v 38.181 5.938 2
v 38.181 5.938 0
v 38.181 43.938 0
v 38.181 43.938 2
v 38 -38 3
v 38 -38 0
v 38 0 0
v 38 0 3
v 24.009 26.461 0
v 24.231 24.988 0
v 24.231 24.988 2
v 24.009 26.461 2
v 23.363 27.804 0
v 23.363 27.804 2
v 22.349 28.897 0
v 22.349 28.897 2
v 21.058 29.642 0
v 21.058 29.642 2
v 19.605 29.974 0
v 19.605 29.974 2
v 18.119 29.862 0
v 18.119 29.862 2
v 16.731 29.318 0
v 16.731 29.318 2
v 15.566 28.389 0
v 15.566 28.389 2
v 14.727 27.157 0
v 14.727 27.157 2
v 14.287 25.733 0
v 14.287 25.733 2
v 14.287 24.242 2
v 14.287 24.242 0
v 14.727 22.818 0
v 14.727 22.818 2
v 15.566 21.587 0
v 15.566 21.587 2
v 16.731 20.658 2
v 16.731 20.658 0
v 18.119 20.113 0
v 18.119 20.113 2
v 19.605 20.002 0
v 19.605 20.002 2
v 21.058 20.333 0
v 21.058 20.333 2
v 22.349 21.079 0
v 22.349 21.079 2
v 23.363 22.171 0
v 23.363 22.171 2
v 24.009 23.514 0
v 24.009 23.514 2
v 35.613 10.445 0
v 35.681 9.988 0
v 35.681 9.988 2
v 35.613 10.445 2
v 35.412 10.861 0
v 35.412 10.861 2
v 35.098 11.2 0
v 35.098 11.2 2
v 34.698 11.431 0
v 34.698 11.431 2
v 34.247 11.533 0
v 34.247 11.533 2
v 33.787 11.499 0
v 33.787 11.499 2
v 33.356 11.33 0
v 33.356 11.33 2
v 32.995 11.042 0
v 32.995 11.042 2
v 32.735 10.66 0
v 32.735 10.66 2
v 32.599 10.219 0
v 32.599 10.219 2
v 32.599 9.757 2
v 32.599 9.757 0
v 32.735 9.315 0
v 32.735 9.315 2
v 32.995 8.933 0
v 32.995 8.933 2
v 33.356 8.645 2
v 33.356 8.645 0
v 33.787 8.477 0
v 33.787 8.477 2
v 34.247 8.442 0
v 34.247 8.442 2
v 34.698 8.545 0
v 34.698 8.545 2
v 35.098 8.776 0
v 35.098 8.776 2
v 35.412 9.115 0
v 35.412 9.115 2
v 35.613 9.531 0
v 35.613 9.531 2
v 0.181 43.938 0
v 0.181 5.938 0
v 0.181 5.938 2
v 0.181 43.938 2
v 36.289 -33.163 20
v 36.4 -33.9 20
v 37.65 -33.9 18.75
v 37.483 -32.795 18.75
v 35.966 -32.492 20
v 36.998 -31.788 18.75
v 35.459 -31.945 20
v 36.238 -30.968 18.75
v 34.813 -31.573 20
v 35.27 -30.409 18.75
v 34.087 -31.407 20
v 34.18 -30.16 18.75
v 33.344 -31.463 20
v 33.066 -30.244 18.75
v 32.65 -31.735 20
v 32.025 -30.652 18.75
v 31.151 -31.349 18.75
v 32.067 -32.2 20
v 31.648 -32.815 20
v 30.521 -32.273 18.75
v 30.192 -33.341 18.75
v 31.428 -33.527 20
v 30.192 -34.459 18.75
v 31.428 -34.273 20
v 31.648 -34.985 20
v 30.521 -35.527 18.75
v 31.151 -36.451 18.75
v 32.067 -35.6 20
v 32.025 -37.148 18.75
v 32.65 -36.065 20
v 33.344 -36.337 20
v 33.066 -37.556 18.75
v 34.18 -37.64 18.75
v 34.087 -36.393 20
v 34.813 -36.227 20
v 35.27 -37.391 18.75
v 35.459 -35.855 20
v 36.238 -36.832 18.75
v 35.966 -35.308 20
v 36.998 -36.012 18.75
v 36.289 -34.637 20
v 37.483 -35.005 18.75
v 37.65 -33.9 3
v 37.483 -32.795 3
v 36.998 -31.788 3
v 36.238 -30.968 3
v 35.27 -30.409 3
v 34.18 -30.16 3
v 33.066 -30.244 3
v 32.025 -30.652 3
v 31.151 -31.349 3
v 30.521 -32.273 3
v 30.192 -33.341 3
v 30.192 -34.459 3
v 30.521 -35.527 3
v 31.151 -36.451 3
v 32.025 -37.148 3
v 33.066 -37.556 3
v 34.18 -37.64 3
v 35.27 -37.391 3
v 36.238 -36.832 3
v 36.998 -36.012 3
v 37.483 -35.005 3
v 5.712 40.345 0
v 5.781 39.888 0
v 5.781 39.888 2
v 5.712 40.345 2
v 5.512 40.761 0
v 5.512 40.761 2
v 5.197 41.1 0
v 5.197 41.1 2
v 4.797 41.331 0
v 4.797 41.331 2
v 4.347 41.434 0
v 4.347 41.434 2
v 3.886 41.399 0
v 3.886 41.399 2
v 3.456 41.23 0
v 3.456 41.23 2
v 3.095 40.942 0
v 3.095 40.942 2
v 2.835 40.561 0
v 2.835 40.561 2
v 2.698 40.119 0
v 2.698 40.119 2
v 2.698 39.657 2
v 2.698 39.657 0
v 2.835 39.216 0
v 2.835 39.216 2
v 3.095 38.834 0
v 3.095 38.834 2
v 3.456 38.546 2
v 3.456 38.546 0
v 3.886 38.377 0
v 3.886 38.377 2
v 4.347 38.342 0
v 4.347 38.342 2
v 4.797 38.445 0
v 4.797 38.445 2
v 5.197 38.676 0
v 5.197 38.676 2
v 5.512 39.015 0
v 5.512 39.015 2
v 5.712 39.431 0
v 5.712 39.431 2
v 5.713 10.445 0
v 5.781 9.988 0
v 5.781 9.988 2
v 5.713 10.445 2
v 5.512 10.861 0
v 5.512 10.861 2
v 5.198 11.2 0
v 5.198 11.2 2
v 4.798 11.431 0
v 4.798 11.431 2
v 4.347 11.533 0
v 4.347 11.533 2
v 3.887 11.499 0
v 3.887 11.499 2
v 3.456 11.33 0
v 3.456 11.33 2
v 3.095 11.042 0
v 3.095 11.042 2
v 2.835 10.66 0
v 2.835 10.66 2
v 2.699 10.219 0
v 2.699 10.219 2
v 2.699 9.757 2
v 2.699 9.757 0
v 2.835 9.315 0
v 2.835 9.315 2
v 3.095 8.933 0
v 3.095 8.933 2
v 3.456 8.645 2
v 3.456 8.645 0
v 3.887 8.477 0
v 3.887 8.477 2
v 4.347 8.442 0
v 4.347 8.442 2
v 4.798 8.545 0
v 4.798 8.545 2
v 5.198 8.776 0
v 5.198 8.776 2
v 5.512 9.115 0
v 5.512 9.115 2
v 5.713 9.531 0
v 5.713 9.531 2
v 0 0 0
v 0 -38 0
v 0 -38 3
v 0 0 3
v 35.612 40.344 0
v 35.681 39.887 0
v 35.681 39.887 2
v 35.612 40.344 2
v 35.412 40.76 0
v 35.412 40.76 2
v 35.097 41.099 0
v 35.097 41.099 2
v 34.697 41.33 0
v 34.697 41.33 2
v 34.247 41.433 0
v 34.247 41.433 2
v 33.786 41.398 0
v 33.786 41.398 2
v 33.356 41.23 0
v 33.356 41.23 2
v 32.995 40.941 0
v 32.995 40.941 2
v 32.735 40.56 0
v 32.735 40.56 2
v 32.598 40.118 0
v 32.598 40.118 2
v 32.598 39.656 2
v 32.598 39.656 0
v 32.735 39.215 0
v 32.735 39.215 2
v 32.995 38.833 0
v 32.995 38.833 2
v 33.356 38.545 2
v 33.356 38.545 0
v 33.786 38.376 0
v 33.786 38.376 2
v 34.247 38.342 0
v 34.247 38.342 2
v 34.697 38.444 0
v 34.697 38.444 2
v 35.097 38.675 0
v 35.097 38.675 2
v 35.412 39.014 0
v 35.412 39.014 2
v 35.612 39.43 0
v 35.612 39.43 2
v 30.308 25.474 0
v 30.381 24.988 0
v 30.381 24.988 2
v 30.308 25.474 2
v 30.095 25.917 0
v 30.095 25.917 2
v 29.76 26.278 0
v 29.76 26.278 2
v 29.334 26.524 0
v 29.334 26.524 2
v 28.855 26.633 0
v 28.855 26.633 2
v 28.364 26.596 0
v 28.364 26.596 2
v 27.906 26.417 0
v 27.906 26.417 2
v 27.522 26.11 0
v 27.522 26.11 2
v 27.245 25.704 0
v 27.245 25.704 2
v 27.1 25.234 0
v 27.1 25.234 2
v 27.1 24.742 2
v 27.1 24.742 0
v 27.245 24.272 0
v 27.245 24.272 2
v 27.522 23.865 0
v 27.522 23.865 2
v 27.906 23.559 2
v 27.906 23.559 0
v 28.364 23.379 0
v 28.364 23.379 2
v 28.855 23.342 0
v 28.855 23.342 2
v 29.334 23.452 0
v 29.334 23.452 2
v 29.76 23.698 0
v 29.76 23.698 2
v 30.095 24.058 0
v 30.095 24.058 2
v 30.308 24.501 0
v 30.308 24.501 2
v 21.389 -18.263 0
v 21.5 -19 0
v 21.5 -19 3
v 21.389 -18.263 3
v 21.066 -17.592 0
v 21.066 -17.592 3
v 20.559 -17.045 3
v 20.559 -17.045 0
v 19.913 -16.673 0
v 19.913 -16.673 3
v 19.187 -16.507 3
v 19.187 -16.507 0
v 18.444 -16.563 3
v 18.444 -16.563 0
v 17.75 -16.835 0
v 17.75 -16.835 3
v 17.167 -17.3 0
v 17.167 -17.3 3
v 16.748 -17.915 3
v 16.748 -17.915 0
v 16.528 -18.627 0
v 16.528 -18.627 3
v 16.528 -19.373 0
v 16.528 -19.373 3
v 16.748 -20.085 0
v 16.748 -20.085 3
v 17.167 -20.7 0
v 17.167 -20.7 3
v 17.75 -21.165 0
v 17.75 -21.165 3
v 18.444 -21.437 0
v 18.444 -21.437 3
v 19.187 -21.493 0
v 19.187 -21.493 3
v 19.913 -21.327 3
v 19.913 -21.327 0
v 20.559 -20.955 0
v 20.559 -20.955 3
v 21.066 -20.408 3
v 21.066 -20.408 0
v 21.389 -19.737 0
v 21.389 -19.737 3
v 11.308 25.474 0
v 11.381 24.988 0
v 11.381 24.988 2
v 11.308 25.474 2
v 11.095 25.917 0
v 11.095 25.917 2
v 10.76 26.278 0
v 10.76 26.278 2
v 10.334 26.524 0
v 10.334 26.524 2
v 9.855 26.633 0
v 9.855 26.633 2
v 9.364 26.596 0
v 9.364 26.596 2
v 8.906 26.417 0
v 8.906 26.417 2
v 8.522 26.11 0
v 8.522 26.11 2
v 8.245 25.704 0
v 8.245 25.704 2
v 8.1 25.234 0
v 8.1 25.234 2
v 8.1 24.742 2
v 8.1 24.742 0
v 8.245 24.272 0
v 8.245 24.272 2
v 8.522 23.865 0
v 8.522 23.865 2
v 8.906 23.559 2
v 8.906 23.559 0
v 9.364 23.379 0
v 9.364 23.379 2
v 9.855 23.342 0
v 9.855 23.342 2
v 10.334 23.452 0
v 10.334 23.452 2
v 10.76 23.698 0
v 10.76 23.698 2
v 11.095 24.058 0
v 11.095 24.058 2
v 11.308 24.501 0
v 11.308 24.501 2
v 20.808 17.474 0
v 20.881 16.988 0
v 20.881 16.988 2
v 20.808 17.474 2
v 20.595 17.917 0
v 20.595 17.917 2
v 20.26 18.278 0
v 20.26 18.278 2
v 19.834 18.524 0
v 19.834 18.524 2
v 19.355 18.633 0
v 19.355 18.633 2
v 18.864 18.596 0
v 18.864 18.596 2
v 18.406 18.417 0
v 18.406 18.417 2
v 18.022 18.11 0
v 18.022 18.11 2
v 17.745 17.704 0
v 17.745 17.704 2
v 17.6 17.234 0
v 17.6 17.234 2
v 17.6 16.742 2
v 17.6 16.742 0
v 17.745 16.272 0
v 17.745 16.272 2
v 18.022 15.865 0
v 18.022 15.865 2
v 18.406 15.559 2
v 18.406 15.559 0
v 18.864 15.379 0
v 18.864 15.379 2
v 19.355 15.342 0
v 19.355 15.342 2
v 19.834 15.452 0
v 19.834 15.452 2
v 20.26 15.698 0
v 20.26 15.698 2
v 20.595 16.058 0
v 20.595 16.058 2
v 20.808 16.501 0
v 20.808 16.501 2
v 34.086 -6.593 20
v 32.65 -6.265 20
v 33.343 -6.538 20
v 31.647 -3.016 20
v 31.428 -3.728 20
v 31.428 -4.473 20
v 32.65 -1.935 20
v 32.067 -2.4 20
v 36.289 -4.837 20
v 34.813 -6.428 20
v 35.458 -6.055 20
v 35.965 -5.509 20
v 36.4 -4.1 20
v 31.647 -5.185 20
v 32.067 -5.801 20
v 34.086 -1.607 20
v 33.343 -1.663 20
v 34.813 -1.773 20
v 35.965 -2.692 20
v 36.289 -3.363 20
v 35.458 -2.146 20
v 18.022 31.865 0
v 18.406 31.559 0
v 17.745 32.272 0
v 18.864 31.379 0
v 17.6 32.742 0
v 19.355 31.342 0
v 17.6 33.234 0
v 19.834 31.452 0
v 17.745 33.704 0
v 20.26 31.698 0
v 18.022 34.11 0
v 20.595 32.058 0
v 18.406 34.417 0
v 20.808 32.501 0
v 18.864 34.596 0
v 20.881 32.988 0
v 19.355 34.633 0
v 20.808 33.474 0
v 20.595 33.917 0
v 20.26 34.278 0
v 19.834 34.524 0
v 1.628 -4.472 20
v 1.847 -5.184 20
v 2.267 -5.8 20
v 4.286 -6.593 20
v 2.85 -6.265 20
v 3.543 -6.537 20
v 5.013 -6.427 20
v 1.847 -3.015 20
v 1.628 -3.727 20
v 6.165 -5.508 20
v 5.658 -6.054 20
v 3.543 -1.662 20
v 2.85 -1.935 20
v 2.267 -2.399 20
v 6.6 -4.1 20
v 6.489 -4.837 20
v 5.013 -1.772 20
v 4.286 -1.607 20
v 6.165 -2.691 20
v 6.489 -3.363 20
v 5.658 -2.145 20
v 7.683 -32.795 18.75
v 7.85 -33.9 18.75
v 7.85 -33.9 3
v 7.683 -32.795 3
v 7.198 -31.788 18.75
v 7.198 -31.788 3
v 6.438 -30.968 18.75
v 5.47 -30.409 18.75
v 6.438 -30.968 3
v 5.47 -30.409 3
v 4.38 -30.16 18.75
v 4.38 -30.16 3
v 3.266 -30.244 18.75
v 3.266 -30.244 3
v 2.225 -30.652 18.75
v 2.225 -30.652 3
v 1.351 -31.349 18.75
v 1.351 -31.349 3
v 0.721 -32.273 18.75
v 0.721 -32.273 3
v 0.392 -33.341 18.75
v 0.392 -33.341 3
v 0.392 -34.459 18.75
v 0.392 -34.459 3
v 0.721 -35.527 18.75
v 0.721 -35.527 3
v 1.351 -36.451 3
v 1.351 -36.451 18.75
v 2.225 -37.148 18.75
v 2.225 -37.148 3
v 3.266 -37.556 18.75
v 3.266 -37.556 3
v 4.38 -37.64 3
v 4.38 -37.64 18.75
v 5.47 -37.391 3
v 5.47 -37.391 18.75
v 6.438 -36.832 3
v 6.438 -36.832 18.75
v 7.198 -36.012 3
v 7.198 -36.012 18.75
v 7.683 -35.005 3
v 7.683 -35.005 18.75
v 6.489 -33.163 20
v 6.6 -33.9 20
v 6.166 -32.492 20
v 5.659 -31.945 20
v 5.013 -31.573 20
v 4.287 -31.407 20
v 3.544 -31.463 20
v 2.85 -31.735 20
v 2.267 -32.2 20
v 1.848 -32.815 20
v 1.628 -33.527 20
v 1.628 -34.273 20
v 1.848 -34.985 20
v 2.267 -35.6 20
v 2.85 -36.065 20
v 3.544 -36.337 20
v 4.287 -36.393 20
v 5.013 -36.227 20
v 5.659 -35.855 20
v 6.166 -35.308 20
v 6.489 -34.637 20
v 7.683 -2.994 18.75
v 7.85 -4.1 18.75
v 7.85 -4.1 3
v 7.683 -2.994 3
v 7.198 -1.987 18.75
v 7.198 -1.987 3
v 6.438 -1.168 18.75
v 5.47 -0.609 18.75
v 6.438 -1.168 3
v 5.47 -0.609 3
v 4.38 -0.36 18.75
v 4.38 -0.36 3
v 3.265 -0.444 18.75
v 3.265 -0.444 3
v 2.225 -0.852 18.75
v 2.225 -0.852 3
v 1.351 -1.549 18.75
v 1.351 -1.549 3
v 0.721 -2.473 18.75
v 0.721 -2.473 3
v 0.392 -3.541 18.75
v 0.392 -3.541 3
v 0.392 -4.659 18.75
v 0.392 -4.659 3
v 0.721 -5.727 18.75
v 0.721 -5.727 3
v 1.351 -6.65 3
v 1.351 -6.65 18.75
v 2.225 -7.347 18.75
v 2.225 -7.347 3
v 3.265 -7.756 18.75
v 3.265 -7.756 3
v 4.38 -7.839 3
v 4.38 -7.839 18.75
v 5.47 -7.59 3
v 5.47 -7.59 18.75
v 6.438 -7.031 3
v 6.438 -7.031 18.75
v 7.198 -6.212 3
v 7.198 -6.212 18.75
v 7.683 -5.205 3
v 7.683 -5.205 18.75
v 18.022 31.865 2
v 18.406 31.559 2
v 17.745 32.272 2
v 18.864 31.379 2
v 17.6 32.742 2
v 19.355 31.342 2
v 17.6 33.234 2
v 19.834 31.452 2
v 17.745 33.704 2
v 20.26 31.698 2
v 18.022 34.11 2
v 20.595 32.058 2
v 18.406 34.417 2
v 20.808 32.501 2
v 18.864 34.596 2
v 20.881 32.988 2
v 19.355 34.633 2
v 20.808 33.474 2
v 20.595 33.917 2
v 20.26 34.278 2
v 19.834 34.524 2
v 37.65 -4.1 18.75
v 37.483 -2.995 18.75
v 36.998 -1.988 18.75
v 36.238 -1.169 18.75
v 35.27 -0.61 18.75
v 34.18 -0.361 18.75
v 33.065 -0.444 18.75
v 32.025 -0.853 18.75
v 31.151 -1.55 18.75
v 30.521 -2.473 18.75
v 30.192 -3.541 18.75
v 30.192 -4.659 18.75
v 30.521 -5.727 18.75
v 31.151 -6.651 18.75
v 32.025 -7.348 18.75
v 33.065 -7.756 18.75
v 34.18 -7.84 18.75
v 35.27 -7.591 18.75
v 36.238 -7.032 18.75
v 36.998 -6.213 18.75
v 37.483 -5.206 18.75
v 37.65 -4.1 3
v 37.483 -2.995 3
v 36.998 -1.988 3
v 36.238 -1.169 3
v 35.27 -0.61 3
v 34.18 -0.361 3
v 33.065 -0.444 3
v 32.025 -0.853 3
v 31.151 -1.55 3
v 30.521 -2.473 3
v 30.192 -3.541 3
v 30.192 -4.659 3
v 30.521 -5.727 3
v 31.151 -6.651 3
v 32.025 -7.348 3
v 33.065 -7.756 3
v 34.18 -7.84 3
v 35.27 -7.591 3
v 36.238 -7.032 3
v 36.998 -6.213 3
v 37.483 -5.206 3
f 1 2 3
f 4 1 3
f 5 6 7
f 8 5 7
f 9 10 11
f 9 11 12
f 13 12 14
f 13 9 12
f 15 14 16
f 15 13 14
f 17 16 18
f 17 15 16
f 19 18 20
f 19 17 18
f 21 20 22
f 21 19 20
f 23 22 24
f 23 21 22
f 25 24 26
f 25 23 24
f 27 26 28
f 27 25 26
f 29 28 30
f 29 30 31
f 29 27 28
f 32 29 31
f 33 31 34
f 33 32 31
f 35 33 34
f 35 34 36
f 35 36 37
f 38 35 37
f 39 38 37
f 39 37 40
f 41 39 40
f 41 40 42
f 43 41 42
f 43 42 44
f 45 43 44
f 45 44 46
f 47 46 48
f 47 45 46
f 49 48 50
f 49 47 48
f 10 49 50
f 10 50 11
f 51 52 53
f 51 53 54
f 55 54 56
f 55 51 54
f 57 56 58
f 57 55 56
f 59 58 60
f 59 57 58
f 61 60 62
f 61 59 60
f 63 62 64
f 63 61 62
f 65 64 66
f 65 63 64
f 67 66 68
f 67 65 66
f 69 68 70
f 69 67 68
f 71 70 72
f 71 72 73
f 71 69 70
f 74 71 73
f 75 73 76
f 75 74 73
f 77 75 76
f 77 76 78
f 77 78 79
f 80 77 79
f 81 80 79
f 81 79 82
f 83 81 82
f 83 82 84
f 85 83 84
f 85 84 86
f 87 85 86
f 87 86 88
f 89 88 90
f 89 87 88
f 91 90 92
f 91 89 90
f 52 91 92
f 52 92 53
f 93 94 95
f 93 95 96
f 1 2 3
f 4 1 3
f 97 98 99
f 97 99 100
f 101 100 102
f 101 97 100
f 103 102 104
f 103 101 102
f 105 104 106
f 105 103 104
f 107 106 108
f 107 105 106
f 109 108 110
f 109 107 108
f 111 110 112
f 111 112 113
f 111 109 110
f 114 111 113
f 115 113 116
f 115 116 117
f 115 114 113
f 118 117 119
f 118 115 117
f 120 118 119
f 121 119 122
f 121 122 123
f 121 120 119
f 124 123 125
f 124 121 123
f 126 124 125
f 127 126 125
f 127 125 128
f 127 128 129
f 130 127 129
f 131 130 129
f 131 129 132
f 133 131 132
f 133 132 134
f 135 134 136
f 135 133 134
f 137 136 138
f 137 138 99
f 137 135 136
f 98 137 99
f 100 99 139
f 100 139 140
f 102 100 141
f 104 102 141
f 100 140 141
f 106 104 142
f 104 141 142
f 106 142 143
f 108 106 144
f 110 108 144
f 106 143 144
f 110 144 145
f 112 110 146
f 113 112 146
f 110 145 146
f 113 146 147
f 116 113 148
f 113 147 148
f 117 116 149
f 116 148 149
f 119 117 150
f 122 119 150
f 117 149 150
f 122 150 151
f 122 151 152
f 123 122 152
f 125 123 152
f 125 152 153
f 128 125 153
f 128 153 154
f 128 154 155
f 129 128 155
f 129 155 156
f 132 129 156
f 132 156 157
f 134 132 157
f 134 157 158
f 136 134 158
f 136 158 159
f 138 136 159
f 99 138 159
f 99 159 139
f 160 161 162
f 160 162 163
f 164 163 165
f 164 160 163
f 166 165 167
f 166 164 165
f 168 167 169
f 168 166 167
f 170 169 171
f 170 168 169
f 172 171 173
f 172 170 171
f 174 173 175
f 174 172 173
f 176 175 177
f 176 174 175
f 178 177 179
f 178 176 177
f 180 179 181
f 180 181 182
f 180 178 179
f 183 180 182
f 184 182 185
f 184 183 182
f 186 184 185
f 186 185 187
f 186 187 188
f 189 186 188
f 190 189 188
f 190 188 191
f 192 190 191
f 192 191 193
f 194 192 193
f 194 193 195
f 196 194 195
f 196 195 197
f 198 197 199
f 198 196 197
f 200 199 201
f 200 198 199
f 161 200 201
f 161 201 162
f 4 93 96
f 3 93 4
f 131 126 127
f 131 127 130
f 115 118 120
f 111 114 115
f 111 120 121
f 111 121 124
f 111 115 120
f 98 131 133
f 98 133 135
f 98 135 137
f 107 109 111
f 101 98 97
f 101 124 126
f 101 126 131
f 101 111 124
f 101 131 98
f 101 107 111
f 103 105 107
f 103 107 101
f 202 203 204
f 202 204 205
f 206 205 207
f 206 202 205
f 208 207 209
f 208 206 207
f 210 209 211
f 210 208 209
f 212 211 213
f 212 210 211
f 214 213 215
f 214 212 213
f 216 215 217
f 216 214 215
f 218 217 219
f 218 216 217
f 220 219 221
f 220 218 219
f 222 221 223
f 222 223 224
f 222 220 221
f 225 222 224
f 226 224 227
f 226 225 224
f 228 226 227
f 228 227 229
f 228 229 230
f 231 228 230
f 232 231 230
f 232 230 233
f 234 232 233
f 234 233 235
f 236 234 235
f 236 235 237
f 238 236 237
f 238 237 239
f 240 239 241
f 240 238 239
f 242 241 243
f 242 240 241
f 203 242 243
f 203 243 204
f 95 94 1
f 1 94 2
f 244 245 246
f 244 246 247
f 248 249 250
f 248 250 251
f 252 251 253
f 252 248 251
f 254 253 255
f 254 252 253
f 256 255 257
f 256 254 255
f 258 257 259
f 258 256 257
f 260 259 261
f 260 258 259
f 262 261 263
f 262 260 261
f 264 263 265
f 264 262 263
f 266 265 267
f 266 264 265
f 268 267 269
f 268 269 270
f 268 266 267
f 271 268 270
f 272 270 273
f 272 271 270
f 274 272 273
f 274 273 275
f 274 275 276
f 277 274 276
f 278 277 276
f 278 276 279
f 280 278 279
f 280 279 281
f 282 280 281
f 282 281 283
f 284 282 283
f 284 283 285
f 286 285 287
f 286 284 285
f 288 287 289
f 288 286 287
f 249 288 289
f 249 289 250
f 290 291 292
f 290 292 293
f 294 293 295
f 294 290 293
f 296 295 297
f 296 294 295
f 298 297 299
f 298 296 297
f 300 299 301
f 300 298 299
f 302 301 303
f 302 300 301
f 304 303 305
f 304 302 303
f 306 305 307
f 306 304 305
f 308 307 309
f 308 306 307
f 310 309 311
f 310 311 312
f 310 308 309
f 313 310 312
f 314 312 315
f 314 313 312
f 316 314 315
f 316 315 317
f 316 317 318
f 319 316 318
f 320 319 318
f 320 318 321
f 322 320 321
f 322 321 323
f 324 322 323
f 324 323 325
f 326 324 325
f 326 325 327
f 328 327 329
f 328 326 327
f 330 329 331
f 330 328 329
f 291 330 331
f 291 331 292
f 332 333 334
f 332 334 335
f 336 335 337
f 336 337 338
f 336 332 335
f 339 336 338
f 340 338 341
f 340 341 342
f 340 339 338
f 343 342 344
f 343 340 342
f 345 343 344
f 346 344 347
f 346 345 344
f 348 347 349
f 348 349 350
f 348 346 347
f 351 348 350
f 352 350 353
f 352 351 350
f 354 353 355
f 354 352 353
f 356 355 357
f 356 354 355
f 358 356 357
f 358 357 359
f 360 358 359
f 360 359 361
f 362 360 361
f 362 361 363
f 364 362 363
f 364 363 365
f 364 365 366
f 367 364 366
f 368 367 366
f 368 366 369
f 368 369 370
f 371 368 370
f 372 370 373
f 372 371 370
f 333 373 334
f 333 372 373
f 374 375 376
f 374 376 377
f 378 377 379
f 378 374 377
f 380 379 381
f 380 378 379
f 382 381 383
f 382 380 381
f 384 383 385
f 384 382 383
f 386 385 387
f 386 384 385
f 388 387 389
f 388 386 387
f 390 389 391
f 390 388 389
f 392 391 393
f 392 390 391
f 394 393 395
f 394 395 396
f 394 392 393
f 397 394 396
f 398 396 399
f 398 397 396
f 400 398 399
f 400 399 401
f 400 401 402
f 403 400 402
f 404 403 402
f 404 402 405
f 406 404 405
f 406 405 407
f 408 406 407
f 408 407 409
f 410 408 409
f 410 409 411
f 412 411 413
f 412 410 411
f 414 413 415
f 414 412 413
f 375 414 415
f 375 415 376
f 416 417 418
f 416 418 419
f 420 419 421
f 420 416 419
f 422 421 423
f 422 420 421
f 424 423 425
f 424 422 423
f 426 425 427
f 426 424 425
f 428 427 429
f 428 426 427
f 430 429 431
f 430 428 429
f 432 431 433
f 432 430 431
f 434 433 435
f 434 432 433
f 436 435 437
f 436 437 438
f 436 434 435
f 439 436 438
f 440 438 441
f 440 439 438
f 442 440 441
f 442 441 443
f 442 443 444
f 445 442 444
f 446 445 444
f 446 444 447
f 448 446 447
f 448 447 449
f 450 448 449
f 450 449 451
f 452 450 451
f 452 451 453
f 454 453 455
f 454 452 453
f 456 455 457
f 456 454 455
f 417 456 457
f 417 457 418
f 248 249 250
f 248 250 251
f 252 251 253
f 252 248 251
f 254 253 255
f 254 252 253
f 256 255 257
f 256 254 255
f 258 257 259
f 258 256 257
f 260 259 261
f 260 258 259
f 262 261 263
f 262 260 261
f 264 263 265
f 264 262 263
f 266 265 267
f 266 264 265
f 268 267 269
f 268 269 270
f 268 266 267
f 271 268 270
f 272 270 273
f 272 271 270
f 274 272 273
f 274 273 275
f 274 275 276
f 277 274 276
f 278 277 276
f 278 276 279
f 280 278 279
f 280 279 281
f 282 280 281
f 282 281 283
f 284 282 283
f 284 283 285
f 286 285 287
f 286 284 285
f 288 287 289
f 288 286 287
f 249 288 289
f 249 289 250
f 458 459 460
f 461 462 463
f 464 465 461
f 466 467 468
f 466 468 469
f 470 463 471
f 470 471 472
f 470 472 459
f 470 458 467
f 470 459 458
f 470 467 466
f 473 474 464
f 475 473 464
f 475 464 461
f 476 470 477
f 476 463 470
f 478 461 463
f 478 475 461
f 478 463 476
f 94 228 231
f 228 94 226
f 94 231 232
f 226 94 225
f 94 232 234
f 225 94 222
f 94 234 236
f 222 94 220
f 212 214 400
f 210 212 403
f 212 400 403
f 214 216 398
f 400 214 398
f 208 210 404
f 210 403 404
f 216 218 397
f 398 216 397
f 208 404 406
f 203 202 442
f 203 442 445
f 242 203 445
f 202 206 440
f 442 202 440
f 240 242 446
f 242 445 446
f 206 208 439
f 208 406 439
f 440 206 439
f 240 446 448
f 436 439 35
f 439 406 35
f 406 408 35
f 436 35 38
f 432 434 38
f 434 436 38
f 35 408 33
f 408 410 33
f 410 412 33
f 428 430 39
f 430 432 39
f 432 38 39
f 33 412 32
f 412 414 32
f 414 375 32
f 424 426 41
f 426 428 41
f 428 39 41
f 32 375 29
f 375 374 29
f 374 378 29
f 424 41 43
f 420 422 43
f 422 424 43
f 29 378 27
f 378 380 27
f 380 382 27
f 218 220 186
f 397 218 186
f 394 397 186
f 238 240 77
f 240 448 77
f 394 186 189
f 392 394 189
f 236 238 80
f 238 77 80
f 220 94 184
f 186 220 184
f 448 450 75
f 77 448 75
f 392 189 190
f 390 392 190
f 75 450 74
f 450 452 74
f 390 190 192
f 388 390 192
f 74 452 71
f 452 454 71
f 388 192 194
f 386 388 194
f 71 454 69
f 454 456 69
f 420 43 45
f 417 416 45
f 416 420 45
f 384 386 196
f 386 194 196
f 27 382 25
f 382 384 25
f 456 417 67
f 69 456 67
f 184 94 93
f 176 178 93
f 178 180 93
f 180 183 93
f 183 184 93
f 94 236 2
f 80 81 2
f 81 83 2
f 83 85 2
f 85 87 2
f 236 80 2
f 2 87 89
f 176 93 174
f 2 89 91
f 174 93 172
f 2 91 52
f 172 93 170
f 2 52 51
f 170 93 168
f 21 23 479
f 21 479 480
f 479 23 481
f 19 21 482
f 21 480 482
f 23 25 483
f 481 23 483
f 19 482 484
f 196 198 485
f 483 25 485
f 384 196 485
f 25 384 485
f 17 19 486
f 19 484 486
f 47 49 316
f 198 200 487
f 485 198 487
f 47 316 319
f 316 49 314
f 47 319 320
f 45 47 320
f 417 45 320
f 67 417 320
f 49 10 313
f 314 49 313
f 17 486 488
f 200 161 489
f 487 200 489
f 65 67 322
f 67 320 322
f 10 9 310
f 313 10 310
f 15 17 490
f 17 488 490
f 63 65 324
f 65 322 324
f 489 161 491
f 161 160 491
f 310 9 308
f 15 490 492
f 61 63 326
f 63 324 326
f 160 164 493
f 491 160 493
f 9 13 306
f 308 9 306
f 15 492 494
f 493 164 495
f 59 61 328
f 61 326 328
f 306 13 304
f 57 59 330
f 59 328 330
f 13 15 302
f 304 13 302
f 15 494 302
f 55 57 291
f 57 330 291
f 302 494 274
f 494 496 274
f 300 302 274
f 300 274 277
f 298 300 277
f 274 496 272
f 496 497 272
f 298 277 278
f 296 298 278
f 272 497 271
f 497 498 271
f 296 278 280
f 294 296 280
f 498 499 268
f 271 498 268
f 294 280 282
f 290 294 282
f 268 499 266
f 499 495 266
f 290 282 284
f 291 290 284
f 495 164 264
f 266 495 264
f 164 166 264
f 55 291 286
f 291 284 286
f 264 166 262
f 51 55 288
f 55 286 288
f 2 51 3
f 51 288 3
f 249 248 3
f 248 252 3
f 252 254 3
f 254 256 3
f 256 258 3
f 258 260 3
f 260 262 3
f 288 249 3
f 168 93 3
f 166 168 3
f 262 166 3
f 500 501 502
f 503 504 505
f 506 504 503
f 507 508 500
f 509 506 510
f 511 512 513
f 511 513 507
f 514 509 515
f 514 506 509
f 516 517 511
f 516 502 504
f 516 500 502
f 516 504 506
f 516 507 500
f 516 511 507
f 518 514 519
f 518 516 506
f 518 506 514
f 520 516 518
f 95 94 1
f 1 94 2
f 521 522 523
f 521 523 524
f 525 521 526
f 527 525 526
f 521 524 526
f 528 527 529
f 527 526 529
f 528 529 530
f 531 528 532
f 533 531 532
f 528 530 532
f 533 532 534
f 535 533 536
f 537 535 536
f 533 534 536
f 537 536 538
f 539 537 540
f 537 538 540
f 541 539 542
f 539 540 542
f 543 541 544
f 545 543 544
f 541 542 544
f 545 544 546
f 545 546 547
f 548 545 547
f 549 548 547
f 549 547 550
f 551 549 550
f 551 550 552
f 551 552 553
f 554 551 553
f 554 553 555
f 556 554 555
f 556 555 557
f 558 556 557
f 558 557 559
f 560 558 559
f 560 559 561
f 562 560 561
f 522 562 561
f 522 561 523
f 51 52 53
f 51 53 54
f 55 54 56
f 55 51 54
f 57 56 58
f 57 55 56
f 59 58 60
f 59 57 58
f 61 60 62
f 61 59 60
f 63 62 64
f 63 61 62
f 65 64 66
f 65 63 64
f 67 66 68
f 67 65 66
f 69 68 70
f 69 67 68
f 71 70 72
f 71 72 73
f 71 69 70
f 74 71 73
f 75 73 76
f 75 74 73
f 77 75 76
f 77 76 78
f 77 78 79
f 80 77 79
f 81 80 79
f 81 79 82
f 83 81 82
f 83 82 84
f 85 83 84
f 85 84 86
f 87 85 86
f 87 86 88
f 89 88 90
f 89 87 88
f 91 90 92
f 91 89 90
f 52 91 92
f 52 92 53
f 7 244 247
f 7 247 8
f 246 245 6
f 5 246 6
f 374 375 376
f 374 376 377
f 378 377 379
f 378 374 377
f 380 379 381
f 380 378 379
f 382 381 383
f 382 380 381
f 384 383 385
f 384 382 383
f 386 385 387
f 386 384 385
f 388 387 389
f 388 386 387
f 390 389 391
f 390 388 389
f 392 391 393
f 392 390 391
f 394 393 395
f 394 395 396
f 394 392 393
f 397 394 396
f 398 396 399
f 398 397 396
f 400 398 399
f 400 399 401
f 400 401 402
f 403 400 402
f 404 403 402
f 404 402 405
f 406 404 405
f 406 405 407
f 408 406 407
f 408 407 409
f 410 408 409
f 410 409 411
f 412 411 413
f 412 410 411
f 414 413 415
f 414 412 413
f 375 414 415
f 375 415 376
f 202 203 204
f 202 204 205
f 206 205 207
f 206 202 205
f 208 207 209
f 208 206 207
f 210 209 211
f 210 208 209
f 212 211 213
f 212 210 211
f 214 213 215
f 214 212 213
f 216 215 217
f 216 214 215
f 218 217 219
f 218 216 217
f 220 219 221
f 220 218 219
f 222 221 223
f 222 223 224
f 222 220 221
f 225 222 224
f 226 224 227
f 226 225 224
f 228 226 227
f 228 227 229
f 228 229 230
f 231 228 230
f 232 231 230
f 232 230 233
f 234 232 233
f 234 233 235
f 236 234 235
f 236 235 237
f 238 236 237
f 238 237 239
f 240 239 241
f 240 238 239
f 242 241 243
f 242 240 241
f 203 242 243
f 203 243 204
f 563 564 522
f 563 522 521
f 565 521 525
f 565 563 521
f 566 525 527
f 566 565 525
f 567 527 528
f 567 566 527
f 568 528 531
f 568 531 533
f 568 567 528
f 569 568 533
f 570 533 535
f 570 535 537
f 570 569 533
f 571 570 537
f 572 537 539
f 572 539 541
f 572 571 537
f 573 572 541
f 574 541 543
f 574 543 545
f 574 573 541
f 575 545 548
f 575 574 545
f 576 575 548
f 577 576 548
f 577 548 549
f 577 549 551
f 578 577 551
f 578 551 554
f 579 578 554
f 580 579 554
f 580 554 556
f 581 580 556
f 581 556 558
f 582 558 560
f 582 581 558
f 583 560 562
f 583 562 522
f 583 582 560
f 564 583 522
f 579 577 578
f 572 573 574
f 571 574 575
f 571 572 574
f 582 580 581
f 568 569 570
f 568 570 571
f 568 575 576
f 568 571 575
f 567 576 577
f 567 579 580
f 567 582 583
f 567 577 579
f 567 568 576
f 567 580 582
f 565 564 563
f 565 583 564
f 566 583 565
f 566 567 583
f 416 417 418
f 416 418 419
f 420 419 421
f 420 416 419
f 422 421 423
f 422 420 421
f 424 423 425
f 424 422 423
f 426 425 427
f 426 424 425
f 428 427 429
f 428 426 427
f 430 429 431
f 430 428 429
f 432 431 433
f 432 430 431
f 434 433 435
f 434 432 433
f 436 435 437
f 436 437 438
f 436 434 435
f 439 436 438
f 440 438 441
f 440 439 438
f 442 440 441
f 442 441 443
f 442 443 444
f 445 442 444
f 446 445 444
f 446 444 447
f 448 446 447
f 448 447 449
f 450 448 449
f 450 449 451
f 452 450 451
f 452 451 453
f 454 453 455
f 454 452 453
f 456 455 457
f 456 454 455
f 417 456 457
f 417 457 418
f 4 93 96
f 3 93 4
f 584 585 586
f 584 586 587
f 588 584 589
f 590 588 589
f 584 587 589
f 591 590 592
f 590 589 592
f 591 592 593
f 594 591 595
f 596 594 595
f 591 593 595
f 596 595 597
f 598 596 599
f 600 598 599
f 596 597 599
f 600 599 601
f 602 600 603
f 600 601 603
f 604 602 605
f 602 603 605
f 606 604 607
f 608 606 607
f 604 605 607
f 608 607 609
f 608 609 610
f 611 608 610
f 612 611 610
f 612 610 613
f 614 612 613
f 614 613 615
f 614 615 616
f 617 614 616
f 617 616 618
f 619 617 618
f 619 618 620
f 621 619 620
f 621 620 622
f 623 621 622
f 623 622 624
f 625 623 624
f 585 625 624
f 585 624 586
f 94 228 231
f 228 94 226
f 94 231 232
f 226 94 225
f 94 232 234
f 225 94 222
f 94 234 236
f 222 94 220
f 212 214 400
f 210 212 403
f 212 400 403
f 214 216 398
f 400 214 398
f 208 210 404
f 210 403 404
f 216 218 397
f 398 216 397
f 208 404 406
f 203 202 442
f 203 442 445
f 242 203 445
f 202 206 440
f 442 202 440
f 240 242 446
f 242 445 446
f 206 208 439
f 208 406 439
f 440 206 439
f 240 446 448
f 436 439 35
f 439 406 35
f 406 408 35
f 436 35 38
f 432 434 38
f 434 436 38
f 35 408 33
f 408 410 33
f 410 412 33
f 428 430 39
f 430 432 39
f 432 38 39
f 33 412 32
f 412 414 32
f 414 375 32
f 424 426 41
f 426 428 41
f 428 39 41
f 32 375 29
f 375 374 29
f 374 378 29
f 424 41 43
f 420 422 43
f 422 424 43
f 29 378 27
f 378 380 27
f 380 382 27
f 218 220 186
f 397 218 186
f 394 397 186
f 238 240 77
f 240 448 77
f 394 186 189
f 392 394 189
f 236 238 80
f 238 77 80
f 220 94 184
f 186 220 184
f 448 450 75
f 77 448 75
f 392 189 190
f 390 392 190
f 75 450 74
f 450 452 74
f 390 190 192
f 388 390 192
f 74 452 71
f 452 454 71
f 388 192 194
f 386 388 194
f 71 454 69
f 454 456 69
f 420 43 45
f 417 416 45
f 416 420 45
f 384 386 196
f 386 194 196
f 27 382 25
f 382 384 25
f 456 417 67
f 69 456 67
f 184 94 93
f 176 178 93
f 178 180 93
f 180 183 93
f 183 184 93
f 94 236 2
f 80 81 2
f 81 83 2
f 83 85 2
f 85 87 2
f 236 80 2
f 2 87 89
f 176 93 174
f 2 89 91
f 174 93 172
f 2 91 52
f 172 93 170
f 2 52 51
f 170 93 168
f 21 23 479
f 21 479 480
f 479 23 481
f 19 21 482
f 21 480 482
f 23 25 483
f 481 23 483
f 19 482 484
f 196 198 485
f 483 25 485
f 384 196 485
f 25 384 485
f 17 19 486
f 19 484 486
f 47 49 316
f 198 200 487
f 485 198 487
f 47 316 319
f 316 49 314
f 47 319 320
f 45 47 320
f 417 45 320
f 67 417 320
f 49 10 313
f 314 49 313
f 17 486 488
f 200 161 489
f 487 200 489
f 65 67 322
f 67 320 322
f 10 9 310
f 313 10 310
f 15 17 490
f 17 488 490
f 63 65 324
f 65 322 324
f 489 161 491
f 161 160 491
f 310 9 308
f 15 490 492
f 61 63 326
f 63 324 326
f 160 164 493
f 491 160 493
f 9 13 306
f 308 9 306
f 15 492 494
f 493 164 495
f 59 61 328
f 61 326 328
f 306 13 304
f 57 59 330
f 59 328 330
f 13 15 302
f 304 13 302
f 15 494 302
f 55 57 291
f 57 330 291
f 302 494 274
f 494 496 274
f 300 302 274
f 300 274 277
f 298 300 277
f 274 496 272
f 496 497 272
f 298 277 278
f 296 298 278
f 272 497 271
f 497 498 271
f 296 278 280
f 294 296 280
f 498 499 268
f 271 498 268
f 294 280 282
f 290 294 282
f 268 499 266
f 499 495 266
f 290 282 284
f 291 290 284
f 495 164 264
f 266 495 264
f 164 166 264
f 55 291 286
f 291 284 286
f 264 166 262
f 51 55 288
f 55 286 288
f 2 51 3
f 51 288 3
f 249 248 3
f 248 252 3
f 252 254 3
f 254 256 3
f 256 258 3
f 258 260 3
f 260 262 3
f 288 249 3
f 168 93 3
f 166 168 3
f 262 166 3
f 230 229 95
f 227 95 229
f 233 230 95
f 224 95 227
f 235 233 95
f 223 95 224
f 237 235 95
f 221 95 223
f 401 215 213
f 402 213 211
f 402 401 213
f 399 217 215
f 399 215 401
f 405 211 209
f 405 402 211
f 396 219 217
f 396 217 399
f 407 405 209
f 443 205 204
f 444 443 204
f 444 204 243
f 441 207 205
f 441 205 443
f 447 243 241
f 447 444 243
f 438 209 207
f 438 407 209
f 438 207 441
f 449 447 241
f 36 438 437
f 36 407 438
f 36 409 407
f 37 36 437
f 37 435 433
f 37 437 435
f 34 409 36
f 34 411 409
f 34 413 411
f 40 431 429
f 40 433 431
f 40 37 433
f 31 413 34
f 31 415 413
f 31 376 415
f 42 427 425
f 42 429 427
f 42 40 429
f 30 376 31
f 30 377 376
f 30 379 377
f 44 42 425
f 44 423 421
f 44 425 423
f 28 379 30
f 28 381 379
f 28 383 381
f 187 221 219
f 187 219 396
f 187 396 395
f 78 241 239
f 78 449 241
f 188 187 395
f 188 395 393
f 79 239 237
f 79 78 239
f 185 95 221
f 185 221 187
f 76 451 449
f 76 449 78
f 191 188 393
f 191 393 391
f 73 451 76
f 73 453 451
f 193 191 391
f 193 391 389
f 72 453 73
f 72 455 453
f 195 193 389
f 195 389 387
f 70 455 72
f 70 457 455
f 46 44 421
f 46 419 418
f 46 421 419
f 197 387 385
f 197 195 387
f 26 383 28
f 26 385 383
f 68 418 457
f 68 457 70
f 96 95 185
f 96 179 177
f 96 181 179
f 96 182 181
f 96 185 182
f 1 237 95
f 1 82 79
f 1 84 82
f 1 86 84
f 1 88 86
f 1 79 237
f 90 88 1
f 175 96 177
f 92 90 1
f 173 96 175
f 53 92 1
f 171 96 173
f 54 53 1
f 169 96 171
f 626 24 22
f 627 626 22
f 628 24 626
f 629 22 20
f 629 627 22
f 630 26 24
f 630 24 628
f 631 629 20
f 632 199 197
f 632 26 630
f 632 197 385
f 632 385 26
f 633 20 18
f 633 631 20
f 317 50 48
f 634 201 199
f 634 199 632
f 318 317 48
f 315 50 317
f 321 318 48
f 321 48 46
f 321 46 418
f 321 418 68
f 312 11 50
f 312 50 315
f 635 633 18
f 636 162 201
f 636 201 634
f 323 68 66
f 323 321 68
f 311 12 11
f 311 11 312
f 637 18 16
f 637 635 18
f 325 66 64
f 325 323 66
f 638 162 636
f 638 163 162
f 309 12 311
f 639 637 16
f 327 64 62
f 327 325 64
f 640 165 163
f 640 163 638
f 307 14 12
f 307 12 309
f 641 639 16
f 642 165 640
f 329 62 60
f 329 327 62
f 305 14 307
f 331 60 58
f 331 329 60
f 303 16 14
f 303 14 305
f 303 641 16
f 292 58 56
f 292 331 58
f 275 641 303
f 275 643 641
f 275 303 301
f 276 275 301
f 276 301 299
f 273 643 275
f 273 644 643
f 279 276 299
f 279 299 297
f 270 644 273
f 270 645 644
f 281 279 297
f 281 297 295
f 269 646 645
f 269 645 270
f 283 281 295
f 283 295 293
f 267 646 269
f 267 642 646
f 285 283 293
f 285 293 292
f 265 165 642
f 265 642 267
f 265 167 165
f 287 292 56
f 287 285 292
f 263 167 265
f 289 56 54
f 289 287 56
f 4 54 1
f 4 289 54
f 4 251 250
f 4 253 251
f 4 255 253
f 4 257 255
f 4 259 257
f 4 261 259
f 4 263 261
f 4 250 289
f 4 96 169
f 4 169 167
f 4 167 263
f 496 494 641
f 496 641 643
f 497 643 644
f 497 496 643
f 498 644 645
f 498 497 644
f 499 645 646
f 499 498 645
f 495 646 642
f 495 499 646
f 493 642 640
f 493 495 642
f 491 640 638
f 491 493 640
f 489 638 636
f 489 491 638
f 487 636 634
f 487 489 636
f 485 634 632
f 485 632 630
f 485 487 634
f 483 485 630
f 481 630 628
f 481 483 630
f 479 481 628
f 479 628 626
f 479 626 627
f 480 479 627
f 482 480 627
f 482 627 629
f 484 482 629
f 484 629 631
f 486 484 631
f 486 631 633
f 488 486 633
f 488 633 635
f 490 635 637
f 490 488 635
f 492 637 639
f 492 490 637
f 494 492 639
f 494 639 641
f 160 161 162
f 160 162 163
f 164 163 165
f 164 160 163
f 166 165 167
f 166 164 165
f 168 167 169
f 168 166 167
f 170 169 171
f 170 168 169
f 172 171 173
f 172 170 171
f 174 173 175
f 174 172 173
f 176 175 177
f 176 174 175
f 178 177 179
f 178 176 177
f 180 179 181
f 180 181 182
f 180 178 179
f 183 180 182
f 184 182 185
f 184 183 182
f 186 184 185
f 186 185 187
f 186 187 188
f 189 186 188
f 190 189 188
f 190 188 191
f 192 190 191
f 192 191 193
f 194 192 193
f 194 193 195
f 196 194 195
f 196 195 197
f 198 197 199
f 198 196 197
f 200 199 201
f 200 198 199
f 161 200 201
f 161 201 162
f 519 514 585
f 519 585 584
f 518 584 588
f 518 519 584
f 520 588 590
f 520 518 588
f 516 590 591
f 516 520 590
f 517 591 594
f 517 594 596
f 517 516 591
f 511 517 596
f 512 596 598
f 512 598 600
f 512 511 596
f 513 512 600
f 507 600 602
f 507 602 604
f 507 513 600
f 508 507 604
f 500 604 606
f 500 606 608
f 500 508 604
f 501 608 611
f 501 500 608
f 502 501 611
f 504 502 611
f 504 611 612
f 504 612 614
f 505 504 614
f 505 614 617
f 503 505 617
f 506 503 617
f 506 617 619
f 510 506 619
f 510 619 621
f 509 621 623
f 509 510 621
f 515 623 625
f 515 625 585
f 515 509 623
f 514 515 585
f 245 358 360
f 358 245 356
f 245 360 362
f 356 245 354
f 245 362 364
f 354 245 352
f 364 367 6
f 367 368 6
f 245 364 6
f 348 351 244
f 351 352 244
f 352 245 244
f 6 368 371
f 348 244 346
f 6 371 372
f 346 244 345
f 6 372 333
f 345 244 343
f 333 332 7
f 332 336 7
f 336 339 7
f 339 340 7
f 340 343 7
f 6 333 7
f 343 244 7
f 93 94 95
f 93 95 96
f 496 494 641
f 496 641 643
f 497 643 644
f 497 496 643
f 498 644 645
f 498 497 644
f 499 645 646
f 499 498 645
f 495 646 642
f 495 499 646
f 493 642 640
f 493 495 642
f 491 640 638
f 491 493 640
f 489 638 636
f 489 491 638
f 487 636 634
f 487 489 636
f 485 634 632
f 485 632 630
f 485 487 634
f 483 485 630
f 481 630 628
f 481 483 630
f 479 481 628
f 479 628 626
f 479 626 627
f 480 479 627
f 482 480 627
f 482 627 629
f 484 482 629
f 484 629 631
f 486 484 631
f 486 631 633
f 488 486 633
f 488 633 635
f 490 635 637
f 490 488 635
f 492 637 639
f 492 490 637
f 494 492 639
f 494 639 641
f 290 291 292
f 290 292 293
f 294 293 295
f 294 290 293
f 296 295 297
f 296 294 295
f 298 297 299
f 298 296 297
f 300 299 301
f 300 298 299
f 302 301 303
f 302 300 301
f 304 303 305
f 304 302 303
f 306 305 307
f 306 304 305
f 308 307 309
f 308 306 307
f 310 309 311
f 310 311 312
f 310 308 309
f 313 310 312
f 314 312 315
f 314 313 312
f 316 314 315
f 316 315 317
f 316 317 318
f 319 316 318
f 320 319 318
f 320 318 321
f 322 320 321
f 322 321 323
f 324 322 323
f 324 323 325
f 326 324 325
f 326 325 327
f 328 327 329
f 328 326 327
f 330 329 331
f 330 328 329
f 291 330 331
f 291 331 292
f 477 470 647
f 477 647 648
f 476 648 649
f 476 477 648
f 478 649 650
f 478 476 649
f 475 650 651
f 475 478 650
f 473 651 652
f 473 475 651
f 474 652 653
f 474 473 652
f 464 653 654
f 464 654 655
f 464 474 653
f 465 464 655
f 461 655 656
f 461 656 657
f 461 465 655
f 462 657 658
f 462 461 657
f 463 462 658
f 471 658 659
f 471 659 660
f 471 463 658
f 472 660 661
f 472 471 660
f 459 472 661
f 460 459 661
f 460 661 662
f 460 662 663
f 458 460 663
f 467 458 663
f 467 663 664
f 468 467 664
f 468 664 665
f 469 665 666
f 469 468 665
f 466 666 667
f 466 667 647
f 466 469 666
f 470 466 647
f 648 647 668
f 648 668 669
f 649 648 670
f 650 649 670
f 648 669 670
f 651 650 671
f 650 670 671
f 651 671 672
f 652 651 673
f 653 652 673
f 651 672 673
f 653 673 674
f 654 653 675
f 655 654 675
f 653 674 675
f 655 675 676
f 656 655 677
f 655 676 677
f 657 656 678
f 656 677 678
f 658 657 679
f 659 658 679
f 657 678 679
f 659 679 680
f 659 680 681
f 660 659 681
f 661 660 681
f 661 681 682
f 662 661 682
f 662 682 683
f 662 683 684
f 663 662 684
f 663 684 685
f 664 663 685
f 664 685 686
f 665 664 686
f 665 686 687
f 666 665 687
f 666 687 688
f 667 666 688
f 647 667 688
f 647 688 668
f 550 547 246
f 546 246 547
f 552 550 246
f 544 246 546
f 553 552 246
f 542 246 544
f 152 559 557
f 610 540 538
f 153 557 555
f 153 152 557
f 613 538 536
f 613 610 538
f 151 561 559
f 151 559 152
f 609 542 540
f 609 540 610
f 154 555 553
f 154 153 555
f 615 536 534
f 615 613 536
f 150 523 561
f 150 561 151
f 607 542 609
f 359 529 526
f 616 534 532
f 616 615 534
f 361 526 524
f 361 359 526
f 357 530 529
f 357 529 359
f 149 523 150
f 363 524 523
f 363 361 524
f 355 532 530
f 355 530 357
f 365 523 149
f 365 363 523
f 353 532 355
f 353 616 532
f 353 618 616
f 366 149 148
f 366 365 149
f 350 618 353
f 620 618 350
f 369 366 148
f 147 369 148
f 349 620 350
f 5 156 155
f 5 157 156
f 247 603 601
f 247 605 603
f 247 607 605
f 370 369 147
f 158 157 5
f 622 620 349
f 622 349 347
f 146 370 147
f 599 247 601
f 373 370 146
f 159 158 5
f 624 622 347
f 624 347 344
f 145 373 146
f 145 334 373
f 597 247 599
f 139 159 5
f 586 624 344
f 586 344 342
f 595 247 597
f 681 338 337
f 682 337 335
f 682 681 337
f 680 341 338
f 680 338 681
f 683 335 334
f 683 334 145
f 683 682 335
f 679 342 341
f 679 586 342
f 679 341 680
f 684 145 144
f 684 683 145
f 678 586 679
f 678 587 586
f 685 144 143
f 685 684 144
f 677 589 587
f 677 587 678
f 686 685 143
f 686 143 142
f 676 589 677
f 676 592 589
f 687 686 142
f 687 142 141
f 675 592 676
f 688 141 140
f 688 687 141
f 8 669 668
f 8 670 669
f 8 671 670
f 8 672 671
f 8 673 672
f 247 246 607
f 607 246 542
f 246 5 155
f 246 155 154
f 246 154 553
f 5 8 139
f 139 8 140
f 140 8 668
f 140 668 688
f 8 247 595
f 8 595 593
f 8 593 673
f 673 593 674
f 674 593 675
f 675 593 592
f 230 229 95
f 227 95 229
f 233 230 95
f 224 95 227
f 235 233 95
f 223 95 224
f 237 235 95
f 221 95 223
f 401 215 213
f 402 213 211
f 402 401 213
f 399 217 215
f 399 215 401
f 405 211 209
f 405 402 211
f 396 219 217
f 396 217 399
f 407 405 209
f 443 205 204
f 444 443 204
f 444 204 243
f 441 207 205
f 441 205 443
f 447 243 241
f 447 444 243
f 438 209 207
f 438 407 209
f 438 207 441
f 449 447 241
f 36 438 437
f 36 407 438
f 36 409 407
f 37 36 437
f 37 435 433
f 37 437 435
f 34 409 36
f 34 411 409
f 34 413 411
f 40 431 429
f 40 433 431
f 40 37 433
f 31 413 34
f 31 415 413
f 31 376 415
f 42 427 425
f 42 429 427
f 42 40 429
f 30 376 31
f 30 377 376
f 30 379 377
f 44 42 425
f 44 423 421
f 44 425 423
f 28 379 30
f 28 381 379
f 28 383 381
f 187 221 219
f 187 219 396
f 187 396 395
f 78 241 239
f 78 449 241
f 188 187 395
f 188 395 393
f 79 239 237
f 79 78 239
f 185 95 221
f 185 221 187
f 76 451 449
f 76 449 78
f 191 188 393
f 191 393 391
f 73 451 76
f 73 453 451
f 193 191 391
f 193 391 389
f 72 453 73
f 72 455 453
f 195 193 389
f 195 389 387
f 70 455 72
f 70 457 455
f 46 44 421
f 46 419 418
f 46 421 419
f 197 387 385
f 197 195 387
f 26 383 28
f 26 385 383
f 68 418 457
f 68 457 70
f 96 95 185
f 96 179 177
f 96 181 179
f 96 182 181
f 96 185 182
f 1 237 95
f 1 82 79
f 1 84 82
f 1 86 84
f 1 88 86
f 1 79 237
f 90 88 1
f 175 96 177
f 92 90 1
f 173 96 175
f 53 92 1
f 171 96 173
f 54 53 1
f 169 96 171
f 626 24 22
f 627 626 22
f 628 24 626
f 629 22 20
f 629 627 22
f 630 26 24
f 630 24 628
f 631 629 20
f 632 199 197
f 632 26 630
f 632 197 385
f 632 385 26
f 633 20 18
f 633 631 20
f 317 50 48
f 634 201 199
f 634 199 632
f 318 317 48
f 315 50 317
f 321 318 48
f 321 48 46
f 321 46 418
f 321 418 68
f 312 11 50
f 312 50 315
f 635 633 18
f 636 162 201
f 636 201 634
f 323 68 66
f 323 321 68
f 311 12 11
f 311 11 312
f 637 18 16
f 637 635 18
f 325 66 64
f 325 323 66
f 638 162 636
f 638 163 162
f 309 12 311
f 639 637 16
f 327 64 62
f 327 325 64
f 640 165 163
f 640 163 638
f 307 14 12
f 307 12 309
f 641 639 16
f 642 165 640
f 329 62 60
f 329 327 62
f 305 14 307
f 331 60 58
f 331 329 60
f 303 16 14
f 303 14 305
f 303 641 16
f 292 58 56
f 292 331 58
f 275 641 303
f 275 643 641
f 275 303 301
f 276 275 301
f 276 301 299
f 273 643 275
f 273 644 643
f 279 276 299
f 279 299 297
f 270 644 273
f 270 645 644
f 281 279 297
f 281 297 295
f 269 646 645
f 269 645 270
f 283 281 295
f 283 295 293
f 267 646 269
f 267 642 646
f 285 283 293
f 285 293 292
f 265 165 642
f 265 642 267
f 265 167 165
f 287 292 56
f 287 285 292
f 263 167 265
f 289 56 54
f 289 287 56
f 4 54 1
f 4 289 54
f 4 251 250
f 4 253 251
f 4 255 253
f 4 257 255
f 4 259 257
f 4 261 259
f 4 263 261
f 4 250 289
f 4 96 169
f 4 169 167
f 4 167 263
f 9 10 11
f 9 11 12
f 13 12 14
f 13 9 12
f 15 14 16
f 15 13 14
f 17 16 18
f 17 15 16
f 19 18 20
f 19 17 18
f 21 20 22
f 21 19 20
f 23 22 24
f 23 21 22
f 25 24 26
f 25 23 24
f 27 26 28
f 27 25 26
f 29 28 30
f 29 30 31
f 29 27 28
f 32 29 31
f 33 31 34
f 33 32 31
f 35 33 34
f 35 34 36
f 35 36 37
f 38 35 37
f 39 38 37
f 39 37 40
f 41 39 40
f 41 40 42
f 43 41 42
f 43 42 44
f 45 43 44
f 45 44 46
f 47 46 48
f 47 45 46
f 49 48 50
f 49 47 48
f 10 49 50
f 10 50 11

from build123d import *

# Parameters (mm, degrees)
F0_W     = 38
F0_H     = 38
F0_R     = 1.55
F0_R_2   = 1.65
F0_R_3   = 5
F1_DEPTH = 2
F0_R_4   = 3.75
F0_R_5   = 2.5
F2_DEPTH = 3
F0_R_6   = 1.4
F3_DEPTH = 20
F4_DEPTH = 20
F5_SIZE  = 1.25
F6_DEPTH = 2


with BuildPart() as f1:
    # F0 (on Top) → F1 (new body)
    with BuildSketch(Plane.XY):
        with Locations((19.181493, 24.937662)):
            Rectangle(F0_W, F0_H)
        with Locations((4.231493, 9.987662)):
            Circle(F0_R, mode=Mode.SUBTRACT)
        with Locations((4.23103, 39.888125)):
            Circle(F0_R, mode=Mode.SUBTRACT)
        with Locations((9.731495, 24.987662)):
            Circle(F0_R_2, mode=Mode.SUBTRACT)
        with Locations((19.231495, 16.987662)):
            Circle(F0_R_2, mode=Mode.SUBTRACT)
        with Locations((34.131493, 9.987662)):
            Circle(F0_R, mode=Mode.SUBTRACT)
        with Locations((19.231495, 24.987662)):
            Circle(F0_R_3, mode=Mode.SUBTRACT)
        with Locations((19.231495, 32.987662)):
            Circle(F0_R_2, mode=Mode.SUBTRACT)
        with Locations((28.731495, 24.987662)):
            Circle(F0_R_2, mode=Mode.SUBTRACT)
        with Locations((34.13103, 39.887199)):
            Circle(F0_R, mode=Mode.SUBTRACT)
    extrude(amount=F1_DEPTH)


with BuildPart() as f2:
    # F0 (on Top) → F2 (new body)
    with BuildSketch(Plane.XY):
        with Locations((19, -19)):
            Rectangle(F0_W, F0_H)
        with Locations((4.1, -33.9)):
            Circle(F0_R_4, mode=Mode.SUBTRACT)
        with Locations((19, -19)):
            Circle(F0_R_5, mode=Mode.SUBTRACT)
        with Locations((4.099627, -4.099627)):
            Circle(F0_R_4, mode=Mode.SUBTRACT)
        with Locations((33.9, -33.9)):
            Circle(F0_R_4, mode=Mode.SUBTRACT)
        with Locations((33.899627, -4.100373)):
            Circle(F0_R_4, mode=Mode.SUBTRACT)
    extrude(amount=F2_DEPTH)



with BuildPart() as f3:
    # F0 (on Top) → F3 (new body)
    with BuildSketch(Plane.XY):
        with Locations((33.9, -33.9)):
            Circle(F0_R_6)
        with Locations((4.1, -33.9)):
            Circle(F0_R_6)
        with Locations((4.099627, -4.099627)):
            Circle(F0_R_6)
        with Locations((33.899627, -4.100373)):
            Circle(F0_R_6)
    extrude(amount=F3_DEPTH)


with BuildPart() as f2_1:
    add(f2.part)

    add(f3.part)  # F4 merges F3
    # F0 (on Top) → F4 (join)
    with BuildSketch(Plane.XY):
        with Locations((4.099627, -4.099627)):
            Circle(F0_R_4)
        with Locations((4.099627, -4.099627)):
            Circle(F0_R_6, mode=Mode.SUBTRACT)
        with Locations((4.1, -33.9)):
            Circle(F0_R_4)
        with Locations((4.1, -33.9)):
            Circle(F0_R_6, mode=Mode.SUBTRACT)
        with Locations((33.9, -33.9)):
            Circle(F0_R_4)
        with Locations((33.9, -33.9)):
            Circle(F0_R_6, mode=Mode.SUBTRACT)
        with Locations((33.899627, -4.100373)):
            Circle(F0_R_4)
        with Locations((33.899627, -4.100373)):
            Circle(F0_R_6, mode=Mode.SUBTRACT)
    extrude(amount=F4_DEPTH)

    # F5
    f5_edges = [f2_1.edges().sort_by_distance(p)[0] for p in [
        (0.349627, -4.099627, 20),
        (30.149627, -4.100373, 20),
        (30.15, -33.9, 20),
        (0.35, -33.9, 20),
    ]]
    chamfer(f5_edges, length=F5_SIZE)


with BuildPart() as f6:
    # F0 (on Top) → F6 (new body)
    with BuildSketch(Plane.XY):
        with Locations((19.181493, 24.937662)):
            Rectangle(F0_W, F0_H)
        with Locations((4.231493, 9.987662)):
            Circle(F0_R, mode=Mode.SUBTRACT)
        with Locations((4.23103, 39.888125)):
            Circle(F0_R, mode=Mode.SUBTRACT)
        with Locations((9.731495, 24.987662)):
            Circle(F0_R_2, mode=Mode.SUBTRACT)
        with Locations((19.231495, 16.987662)):
            Circle(F0_R_2, mode=Mode.SUBTRACT)
        with Locations((34.131493, 9.987662)):
            Circle(F0_R, mode=Mode.SUBTRACT)
        with Locations((19.231495, 24.987662)):
            Circle(F0_R_3, mode=Mode.SUBTRACT)
        with Locations((19.231495, 32.987662)):
            Circle(F0_R_2, mode=Mode.SUBTRACT)
        with Locations((28.731495, 24.987662)):
            Circle(F0_R_2, mode=Mode.SUBTRACT)
        with Locations((34.13103, 39.887199)):
            Circle(F0_R, mode=Mode.SUBTRACT)
    extrude(amount=F6_DEPTH)


solid = Compound([f1.part, f2_1.part, f6.part])
